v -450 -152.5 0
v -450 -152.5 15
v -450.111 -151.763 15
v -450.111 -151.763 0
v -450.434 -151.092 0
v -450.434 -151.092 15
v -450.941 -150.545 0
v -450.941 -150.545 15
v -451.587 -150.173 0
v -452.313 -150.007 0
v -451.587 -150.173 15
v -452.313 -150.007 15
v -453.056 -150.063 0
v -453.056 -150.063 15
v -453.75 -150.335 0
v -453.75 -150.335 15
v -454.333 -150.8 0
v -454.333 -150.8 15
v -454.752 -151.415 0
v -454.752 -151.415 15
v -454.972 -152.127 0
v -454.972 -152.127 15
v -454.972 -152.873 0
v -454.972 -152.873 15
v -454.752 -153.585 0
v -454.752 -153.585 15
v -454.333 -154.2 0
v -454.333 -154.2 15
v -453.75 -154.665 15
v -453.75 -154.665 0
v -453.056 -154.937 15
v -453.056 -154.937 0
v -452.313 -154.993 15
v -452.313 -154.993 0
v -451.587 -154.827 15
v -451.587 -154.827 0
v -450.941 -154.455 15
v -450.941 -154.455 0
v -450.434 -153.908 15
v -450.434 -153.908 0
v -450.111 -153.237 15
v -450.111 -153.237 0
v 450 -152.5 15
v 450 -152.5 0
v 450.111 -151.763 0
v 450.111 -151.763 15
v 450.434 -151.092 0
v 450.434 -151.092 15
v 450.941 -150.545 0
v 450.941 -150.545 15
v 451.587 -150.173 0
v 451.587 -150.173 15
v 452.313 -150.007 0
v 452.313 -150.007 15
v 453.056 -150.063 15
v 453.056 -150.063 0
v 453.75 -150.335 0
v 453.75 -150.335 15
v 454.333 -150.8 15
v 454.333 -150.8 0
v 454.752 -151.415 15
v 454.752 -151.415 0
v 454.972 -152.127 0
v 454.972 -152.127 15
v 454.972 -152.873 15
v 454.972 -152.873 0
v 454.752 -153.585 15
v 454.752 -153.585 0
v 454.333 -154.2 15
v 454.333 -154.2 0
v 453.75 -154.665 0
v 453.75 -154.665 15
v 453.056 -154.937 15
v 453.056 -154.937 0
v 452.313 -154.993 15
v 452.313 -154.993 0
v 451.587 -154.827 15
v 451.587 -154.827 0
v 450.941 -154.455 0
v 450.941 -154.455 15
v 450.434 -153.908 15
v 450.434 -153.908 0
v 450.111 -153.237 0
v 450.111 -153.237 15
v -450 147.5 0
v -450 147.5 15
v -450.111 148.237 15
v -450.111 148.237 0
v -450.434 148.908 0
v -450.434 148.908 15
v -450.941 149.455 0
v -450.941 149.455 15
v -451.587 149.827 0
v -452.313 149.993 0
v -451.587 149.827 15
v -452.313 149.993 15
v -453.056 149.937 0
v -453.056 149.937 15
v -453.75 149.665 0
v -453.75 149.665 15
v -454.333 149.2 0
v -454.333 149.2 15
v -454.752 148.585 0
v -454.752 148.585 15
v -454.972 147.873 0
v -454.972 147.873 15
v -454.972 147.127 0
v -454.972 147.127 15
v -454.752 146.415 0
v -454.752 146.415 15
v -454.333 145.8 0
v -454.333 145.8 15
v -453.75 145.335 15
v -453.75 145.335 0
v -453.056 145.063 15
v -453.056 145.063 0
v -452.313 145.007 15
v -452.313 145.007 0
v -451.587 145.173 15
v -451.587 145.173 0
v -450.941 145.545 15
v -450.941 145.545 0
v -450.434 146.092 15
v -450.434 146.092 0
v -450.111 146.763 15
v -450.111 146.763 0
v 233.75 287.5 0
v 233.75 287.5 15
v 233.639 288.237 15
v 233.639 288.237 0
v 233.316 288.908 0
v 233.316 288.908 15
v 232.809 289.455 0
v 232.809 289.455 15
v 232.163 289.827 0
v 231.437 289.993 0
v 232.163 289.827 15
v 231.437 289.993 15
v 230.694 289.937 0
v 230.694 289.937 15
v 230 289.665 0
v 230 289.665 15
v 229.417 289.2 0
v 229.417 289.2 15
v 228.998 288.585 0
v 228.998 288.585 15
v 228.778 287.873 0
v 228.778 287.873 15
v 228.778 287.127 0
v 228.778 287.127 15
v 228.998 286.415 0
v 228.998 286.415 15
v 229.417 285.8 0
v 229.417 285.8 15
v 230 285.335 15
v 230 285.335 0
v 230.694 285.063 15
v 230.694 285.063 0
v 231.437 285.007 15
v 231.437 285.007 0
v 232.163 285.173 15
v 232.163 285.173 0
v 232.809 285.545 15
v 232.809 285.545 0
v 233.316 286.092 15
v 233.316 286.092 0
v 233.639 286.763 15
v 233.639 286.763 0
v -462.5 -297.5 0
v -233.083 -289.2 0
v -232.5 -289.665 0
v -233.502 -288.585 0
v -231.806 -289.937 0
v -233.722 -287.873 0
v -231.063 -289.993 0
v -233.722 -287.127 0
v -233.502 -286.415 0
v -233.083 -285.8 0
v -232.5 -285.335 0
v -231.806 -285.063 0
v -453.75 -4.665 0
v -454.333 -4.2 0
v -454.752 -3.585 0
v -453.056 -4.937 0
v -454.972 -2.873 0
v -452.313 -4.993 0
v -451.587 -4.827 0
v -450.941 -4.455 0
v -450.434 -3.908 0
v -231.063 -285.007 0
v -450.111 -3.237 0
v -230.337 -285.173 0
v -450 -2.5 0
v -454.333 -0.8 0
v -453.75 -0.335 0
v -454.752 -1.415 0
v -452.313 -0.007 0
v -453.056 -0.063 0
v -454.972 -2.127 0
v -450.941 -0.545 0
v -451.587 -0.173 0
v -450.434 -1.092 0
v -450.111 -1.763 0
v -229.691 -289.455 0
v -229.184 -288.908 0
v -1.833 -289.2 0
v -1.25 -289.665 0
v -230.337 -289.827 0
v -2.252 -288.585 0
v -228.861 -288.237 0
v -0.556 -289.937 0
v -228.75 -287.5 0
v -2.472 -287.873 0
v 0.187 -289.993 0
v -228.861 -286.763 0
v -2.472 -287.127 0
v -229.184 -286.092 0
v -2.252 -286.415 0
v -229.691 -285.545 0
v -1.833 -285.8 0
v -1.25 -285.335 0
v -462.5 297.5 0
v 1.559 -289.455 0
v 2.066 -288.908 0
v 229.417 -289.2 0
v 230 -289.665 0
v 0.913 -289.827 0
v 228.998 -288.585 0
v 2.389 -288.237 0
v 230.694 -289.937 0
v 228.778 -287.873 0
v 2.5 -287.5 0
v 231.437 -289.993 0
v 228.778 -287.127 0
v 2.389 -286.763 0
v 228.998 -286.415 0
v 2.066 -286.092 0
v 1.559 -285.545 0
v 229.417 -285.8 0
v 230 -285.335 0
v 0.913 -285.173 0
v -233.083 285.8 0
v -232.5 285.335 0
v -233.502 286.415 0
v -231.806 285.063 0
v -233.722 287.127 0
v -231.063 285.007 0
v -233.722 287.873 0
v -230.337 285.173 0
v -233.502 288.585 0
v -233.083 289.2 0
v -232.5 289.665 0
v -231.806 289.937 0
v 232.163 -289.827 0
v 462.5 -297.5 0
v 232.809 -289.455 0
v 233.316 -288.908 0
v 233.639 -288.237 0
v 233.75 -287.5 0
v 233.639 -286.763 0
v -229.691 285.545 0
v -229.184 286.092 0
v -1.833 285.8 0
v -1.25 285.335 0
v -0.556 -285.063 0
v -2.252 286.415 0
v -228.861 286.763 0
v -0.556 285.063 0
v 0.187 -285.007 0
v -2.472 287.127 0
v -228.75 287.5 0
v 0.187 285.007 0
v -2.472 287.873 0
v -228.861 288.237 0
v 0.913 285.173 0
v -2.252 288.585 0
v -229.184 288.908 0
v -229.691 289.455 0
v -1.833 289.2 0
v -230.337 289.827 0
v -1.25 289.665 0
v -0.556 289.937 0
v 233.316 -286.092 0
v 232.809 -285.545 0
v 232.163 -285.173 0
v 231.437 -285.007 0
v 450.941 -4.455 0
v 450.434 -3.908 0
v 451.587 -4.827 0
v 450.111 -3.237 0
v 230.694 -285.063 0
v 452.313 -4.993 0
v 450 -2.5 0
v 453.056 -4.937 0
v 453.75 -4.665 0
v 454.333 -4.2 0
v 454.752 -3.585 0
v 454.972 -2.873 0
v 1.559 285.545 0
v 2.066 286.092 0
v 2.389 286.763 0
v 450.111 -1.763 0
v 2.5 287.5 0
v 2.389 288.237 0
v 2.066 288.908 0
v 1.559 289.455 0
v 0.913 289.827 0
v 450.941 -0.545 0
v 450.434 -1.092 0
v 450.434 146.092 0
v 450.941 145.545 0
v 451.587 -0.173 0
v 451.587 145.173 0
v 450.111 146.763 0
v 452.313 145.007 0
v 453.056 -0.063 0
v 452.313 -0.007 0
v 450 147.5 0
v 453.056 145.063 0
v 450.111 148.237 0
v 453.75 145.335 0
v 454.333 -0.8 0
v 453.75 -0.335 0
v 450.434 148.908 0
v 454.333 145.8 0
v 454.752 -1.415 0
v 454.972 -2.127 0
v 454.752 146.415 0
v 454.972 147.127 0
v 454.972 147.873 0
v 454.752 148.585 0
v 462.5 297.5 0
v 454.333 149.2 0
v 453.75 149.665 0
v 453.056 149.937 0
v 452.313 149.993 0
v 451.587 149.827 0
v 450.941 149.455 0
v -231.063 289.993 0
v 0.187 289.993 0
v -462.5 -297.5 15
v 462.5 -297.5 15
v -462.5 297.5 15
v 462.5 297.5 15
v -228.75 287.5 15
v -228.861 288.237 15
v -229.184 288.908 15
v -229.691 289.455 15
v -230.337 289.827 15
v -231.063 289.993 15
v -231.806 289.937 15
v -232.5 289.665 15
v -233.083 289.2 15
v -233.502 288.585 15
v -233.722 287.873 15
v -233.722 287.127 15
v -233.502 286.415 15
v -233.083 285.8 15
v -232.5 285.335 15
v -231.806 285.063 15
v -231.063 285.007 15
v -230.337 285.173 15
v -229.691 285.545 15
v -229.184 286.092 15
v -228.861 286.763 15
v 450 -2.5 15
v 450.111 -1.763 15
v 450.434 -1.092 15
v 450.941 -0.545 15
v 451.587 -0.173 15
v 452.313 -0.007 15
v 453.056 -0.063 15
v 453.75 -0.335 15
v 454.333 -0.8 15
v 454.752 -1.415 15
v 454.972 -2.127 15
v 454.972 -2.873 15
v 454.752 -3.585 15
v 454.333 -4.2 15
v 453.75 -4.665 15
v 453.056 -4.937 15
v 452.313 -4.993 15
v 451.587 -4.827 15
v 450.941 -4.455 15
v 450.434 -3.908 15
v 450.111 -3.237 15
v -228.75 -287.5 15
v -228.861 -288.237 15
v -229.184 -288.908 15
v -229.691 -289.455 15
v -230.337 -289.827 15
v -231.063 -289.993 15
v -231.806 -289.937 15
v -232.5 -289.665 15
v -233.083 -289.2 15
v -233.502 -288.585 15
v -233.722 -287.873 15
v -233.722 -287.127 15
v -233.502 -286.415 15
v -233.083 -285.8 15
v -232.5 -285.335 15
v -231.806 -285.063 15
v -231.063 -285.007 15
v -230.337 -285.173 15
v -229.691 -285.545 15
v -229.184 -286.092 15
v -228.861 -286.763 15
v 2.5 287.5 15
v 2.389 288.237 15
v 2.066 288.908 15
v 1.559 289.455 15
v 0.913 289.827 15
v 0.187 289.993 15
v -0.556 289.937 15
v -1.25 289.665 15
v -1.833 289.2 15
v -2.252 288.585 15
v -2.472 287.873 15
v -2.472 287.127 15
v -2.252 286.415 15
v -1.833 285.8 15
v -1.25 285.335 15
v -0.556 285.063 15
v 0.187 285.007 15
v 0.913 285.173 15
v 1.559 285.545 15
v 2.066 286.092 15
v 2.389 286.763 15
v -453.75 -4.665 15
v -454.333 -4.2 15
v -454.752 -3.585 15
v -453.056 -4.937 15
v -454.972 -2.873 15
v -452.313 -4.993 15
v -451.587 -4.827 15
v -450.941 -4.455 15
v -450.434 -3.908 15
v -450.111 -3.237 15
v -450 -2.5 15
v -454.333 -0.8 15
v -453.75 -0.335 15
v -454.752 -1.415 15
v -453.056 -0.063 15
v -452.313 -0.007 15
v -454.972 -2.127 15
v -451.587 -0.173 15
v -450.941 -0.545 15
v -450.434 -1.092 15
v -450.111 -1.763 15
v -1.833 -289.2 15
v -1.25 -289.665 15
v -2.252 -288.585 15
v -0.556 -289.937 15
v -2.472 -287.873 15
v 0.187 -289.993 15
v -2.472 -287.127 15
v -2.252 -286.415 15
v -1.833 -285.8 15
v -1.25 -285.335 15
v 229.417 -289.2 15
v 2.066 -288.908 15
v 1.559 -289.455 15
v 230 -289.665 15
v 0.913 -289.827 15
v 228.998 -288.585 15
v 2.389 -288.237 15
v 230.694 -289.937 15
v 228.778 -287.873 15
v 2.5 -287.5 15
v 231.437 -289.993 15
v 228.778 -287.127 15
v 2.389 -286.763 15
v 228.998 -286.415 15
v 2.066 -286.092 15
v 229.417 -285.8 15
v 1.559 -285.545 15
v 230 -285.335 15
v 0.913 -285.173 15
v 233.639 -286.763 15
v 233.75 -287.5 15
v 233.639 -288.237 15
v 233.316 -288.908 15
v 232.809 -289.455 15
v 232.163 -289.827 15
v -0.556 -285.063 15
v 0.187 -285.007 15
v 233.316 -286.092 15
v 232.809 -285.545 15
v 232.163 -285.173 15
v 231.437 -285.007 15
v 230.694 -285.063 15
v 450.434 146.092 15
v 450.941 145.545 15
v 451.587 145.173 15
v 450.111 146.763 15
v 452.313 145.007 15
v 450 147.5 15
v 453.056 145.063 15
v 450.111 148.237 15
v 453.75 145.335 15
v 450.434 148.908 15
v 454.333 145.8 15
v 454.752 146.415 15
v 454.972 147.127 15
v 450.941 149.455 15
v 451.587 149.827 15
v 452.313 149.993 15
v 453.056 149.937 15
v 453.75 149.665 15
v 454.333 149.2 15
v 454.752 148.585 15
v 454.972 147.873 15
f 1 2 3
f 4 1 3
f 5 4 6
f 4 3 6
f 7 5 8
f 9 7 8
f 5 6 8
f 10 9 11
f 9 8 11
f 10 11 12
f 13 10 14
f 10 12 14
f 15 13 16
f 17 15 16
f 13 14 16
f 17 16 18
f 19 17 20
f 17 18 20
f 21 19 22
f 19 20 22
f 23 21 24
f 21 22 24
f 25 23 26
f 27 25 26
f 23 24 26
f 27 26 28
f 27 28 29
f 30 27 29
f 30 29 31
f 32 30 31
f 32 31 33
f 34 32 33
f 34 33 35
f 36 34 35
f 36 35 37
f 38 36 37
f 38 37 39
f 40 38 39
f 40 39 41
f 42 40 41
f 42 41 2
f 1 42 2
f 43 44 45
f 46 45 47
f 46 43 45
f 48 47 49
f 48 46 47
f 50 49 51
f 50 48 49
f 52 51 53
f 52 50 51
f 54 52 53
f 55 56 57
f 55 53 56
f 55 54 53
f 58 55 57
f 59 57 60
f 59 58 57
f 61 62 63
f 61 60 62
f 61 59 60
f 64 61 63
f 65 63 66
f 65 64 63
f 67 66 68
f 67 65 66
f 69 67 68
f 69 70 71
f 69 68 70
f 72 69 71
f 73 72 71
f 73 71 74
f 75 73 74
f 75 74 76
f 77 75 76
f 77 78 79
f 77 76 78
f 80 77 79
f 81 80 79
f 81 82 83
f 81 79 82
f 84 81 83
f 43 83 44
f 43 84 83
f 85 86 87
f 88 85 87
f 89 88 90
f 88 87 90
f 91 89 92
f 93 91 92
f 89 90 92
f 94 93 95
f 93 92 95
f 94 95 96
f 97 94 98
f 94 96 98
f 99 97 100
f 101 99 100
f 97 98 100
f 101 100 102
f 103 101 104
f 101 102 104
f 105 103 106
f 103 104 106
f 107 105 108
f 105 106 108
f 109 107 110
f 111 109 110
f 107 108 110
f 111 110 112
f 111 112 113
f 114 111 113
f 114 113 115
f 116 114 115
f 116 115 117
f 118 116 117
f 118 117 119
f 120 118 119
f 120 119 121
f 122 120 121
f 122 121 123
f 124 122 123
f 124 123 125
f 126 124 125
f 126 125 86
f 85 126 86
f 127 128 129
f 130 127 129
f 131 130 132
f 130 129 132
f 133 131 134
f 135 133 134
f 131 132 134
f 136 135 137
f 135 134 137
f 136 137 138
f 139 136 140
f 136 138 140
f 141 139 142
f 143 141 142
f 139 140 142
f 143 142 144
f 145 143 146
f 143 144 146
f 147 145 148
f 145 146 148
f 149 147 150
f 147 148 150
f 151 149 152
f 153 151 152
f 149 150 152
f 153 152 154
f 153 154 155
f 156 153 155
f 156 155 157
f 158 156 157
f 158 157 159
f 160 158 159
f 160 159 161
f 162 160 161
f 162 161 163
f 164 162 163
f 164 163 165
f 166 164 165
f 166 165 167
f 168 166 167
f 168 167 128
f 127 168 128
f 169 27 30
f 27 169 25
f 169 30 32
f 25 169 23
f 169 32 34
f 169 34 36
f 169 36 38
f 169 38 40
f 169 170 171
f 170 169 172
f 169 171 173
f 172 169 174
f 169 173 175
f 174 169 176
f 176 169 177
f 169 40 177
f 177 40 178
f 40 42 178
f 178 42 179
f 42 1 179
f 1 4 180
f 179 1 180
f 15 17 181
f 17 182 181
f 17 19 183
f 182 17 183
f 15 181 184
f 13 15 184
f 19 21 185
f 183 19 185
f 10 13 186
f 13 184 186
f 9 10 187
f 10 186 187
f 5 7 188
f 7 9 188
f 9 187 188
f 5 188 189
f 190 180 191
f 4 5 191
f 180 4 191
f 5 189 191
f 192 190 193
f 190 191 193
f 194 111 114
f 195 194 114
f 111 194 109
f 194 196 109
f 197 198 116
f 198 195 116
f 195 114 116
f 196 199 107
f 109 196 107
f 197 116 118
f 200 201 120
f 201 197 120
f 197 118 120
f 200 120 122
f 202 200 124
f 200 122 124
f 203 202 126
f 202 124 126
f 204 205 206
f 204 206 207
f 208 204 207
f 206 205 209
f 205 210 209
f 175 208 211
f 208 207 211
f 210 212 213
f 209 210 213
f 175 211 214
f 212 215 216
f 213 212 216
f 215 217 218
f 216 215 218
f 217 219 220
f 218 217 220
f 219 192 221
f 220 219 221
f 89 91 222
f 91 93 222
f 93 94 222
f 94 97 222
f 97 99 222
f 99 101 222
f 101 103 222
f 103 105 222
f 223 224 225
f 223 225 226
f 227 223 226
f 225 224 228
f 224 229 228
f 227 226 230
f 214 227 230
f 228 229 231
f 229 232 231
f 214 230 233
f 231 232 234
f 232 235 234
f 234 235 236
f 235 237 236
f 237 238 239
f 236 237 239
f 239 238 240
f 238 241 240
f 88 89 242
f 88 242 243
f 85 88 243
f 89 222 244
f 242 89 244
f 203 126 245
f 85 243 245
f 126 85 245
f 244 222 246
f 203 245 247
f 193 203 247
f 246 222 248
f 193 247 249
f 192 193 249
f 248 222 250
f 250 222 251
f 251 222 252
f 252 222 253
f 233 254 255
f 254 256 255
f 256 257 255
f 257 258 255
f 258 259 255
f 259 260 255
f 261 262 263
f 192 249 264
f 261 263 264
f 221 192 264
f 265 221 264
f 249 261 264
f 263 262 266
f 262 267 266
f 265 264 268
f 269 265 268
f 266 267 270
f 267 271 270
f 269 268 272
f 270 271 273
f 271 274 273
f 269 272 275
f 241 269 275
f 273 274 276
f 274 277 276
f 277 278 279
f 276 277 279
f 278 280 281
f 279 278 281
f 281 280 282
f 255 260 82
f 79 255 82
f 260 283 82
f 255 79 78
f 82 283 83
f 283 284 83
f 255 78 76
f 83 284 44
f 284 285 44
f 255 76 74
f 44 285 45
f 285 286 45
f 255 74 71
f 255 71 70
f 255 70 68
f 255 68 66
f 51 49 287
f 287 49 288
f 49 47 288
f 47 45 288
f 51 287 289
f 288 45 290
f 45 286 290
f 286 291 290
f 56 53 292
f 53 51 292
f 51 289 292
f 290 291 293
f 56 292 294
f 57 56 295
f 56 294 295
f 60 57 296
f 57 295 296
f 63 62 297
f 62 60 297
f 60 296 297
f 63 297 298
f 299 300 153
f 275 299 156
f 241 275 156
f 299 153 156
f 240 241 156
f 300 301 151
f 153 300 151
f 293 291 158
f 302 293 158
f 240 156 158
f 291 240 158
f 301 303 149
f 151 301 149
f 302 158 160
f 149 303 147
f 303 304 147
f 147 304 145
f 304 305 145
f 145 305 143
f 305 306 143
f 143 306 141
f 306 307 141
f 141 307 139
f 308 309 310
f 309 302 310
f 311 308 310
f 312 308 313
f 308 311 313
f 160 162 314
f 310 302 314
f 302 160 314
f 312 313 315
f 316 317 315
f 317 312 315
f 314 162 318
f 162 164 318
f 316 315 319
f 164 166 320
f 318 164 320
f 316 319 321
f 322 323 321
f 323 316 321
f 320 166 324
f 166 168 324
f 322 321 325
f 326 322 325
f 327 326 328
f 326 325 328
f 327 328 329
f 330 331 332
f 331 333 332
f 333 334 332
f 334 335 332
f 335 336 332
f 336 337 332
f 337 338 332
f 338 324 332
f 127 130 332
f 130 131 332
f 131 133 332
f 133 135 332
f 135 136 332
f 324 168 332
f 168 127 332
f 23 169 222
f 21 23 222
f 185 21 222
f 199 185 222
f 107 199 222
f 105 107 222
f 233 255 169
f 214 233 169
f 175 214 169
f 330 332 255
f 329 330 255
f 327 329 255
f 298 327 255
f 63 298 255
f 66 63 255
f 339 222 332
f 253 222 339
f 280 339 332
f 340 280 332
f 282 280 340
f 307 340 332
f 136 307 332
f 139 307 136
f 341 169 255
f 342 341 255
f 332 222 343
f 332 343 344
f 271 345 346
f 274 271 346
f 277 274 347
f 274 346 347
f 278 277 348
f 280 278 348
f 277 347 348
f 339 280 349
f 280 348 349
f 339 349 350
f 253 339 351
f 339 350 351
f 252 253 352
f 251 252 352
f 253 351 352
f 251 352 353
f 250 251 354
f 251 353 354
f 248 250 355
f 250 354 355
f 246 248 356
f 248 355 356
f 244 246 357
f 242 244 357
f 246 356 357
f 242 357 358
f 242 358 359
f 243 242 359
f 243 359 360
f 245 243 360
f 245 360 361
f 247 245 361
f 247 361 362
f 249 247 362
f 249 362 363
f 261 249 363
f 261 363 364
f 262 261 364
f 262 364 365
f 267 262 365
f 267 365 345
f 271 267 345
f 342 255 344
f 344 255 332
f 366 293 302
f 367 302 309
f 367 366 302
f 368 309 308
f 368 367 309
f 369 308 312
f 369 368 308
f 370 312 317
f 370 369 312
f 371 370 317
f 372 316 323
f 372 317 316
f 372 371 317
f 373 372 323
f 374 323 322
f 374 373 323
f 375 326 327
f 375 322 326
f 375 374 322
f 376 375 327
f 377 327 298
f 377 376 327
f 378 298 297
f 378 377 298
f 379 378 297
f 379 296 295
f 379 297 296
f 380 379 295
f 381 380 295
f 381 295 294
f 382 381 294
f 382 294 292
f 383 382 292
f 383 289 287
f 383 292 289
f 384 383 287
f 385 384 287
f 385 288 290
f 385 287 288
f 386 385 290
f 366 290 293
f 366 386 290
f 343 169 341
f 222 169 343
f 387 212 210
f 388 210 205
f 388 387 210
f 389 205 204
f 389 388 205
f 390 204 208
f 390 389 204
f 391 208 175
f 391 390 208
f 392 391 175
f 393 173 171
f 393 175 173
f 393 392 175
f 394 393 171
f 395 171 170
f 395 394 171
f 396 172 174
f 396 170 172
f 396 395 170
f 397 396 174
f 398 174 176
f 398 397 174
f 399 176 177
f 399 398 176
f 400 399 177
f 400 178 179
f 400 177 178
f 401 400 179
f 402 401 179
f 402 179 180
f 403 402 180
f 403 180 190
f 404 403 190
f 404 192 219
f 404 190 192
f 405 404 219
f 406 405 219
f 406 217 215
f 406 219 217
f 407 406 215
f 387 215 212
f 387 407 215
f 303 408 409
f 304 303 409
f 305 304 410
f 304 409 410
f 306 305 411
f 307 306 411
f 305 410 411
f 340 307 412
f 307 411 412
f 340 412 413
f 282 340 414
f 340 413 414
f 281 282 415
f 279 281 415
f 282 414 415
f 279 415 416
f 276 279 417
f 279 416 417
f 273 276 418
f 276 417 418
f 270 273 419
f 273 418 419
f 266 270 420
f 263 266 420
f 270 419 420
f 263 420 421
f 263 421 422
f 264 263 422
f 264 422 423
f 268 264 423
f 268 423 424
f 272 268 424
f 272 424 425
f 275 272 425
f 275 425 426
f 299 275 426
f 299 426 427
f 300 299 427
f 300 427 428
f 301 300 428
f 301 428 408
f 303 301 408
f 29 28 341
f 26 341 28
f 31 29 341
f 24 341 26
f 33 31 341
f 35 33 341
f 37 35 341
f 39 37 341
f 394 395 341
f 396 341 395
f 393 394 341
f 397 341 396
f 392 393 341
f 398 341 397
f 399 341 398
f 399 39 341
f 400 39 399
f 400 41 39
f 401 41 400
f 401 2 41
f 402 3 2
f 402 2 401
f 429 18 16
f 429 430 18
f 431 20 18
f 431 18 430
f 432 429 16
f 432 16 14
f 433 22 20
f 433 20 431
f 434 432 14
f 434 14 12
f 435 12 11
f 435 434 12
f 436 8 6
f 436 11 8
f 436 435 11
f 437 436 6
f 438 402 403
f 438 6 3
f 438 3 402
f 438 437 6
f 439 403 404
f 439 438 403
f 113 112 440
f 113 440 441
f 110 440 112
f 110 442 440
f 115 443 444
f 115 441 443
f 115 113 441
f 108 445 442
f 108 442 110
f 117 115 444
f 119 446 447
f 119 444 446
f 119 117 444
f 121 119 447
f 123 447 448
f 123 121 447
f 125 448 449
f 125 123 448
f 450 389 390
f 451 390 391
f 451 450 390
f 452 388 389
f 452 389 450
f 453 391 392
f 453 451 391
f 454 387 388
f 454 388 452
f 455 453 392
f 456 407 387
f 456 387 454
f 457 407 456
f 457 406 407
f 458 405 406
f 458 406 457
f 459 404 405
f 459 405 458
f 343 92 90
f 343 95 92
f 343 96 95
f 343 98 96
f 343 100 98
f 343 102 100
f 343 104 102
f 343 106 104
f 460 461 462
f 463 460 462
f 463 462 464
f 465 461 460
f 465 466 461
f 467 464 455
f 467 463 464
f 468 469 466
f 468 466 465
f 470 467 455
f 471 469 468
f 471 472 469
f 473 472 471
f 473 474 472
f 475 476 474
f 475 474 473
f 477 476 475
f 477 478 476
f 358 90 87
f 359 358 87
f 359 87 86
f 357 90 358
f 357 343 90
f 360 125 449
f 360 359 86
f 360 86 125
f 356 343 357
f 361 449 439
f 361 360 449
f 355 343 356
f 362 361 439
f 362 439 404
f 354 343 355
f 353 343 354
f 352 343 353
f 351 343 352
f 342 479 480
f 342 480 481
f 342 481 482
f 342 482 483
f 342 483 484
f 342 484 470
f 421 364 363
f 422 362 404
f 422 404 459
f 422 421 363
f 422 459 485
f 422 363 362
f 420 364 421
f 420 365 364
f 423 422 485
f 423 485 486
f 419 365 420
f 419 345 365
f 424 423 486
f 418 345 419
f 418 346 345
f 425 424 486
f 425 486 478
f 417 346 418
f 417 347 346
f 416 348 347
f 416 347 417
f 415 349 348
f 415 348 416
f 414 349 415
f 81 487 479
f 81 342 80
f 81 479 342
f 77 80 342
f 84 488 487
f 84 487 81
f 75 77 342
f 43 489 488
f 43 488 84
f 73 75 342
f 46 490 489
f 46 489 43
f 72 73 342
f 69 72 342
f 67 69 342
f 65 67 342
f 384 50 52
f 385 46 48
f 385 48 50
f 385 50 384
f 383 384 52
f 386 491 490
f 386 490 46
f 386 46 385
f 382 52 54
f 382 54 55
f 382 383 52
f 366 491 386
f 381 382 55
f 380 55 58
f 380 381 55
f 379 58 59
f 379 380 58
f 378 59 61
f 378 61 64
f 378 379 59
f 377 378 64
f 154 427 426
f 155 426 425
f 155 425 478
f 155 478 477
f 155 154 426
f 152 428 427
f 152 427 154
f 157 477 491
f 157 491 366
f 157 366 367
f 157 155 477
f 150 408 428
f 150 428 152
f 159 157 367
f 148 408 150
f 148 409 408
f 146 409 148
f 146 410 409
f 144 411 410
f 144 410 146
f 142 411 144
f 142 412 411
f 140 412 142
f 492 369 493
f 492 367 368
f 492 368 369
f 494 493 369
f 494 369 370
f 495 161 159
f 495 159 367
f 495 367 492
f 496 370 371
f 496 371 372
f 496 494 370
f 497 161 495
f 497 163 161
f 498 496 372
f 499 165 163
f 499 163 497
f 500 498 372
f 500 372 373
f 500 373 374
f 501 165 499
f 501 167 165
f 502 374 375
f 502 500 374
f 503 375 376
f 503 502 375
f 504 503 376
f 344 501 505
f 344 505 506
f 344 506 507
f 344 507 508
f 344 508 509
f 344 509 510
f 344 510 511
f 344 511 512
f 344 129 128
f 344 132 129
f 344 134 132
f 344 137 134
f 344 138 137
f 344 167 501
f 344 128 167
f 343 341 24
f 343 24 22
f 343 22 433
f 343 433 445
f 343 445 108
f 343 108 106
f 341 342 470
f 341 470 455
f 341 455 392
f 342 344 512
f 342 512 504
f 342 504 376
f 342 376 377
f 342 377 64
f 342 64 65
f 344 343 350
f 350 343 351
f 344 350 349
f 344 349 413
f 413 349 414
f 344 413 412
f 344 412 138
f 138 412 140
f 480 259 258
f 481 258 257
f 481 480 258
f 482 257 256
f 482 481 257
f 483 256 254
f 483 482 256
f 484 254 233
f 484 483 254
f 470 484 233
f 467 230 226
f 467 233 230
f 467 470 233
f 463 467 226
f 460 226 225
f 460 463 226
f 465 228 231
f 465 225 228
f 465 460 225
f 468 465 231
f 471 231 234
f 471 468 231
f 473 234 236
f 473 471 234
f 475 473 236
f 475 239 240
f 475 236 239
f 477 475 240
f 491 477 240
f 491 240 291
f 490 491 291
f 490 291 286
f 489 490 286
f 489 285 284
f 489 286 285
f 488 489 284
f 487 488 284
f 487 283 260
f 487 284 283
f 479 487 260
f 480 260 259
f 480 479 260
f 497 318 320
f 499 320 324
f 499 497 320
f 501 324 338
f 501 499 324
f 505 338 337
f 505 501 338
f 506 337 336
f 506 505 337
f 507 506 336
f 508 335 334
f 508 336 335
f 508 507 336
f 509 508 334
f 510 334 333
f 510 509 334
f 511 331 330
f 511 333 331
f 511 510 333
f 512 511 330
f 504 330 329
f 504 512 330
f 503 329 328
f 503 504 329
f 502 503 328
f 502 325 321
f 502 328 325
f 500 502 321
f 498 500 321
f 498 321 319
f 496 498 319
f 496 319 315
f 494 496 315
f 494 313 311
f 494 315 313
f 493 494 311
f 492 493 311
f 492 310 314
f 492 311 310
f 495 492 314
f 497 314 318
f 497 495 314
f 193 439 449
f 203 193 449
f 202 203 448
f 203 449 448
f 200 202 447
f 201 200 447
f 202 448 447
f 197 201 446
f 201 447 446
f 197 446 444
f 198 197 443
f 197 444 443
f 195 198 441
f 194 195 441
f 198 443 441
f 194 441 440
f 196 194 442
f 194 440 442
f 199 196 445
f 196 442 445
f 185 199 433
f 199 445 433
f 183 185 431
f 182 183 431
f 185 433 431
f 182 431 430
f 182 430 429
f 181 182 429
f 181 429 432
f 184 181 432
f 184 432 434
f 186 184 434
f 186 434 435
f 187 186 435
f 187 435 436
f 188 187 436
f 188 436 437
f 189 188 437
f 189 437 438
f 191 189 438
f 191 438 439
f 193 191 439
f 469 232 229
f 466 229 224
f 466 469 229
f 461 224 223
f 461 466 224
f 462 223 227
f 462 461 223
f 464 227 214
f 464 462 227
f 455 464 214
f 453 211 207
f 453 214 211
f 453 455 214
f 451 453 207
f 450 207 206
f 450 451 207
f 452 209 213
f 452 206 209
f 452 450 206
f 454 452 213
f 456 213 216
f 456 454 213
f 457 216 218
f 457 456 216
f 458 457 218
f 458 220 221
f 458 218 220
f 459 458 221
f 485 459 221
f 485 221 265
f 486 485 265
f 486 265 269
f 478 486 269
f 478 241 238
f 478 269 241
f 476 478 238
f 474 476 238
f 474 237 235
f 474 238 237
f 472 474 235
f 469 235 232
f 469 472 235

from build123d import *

# Parameters (mm, degrees)
SKETCH_1_W          = 925
SKETCH_1_H          = 595
EXTRUDE_1_DEPTH     = 15
SKETCH_2_R          = 2.5
CUT_EXTRUDE_1_DEPTH = 16
SKETCH_2_3_R        = 2.5
CUT_EXTRUDE_2_DEPTH = 16


with BuildPart() as part:
    # ｽｹｯﾁ1 → ﾎﾞｽ - 押し出し1 (new body)
    with BuildSketch(Plane.XY):
        Rectangle(SKETCH_1_W, SKETCH_1_H)
    extrude(amount=EXTRUDE_1_DEPTH)

    # ｽｹｯﾁ2 → ｶｯﾄ - 押し出し1 (cut, through all)
    with BuildSketch(Plane.XY.offset(15)):
        with Locations((-231.25, 287.5)):
            Circle(SKETCH_2_R)
        with Locations((0, 287.5)):
            Circle(SKETCH_2_R)
        with Locations((231.25, 287.5)):
            Circle(SKETCH_2_R)
    cut_extrude_1 = extrude(amount=-CUT_EXTRUDE_1_DEPTH, mode=Mode.SUBTRACT)

    # ｽｹｯﾁ2<3> → ｶｯﾄ - 押し出し2 (cut, through all)
    with BuildSketch(Plane.XY.offset(15)):
        with Locations((-452.5, 147.5)):
            Circle(SKETCH_2_3_R)
        with Locations((-452.5, -2.5)):
            Circle(SKETCH_2_3_R)
        with Locations((-452.5, -152.5)):
            Circle(SKETCH_2_3_R)
    cut_extrude_2 = extrude(amount=-CUT_EXTRUDE_2_DEPTH, mode=Mode.SUBTRACT)

    # ﾐﾗｰ1: ｶｯﾄ - 押し出し1 across plane
    add(cut_extrude_1.mirror(Plane.ZX), mode=Mode.SUBTRACT)

    # ﾐﾗｰ2: ｶｯﾄ - 押し出し2 across plane
    add(cut_extrude_2.mirror(Plane(origin=(0, 0, 0), x_dir=(0, 0, 1), z_dir=(1, 0, 0))), mode=Mode.SUBTRACT)


solid = part.part
